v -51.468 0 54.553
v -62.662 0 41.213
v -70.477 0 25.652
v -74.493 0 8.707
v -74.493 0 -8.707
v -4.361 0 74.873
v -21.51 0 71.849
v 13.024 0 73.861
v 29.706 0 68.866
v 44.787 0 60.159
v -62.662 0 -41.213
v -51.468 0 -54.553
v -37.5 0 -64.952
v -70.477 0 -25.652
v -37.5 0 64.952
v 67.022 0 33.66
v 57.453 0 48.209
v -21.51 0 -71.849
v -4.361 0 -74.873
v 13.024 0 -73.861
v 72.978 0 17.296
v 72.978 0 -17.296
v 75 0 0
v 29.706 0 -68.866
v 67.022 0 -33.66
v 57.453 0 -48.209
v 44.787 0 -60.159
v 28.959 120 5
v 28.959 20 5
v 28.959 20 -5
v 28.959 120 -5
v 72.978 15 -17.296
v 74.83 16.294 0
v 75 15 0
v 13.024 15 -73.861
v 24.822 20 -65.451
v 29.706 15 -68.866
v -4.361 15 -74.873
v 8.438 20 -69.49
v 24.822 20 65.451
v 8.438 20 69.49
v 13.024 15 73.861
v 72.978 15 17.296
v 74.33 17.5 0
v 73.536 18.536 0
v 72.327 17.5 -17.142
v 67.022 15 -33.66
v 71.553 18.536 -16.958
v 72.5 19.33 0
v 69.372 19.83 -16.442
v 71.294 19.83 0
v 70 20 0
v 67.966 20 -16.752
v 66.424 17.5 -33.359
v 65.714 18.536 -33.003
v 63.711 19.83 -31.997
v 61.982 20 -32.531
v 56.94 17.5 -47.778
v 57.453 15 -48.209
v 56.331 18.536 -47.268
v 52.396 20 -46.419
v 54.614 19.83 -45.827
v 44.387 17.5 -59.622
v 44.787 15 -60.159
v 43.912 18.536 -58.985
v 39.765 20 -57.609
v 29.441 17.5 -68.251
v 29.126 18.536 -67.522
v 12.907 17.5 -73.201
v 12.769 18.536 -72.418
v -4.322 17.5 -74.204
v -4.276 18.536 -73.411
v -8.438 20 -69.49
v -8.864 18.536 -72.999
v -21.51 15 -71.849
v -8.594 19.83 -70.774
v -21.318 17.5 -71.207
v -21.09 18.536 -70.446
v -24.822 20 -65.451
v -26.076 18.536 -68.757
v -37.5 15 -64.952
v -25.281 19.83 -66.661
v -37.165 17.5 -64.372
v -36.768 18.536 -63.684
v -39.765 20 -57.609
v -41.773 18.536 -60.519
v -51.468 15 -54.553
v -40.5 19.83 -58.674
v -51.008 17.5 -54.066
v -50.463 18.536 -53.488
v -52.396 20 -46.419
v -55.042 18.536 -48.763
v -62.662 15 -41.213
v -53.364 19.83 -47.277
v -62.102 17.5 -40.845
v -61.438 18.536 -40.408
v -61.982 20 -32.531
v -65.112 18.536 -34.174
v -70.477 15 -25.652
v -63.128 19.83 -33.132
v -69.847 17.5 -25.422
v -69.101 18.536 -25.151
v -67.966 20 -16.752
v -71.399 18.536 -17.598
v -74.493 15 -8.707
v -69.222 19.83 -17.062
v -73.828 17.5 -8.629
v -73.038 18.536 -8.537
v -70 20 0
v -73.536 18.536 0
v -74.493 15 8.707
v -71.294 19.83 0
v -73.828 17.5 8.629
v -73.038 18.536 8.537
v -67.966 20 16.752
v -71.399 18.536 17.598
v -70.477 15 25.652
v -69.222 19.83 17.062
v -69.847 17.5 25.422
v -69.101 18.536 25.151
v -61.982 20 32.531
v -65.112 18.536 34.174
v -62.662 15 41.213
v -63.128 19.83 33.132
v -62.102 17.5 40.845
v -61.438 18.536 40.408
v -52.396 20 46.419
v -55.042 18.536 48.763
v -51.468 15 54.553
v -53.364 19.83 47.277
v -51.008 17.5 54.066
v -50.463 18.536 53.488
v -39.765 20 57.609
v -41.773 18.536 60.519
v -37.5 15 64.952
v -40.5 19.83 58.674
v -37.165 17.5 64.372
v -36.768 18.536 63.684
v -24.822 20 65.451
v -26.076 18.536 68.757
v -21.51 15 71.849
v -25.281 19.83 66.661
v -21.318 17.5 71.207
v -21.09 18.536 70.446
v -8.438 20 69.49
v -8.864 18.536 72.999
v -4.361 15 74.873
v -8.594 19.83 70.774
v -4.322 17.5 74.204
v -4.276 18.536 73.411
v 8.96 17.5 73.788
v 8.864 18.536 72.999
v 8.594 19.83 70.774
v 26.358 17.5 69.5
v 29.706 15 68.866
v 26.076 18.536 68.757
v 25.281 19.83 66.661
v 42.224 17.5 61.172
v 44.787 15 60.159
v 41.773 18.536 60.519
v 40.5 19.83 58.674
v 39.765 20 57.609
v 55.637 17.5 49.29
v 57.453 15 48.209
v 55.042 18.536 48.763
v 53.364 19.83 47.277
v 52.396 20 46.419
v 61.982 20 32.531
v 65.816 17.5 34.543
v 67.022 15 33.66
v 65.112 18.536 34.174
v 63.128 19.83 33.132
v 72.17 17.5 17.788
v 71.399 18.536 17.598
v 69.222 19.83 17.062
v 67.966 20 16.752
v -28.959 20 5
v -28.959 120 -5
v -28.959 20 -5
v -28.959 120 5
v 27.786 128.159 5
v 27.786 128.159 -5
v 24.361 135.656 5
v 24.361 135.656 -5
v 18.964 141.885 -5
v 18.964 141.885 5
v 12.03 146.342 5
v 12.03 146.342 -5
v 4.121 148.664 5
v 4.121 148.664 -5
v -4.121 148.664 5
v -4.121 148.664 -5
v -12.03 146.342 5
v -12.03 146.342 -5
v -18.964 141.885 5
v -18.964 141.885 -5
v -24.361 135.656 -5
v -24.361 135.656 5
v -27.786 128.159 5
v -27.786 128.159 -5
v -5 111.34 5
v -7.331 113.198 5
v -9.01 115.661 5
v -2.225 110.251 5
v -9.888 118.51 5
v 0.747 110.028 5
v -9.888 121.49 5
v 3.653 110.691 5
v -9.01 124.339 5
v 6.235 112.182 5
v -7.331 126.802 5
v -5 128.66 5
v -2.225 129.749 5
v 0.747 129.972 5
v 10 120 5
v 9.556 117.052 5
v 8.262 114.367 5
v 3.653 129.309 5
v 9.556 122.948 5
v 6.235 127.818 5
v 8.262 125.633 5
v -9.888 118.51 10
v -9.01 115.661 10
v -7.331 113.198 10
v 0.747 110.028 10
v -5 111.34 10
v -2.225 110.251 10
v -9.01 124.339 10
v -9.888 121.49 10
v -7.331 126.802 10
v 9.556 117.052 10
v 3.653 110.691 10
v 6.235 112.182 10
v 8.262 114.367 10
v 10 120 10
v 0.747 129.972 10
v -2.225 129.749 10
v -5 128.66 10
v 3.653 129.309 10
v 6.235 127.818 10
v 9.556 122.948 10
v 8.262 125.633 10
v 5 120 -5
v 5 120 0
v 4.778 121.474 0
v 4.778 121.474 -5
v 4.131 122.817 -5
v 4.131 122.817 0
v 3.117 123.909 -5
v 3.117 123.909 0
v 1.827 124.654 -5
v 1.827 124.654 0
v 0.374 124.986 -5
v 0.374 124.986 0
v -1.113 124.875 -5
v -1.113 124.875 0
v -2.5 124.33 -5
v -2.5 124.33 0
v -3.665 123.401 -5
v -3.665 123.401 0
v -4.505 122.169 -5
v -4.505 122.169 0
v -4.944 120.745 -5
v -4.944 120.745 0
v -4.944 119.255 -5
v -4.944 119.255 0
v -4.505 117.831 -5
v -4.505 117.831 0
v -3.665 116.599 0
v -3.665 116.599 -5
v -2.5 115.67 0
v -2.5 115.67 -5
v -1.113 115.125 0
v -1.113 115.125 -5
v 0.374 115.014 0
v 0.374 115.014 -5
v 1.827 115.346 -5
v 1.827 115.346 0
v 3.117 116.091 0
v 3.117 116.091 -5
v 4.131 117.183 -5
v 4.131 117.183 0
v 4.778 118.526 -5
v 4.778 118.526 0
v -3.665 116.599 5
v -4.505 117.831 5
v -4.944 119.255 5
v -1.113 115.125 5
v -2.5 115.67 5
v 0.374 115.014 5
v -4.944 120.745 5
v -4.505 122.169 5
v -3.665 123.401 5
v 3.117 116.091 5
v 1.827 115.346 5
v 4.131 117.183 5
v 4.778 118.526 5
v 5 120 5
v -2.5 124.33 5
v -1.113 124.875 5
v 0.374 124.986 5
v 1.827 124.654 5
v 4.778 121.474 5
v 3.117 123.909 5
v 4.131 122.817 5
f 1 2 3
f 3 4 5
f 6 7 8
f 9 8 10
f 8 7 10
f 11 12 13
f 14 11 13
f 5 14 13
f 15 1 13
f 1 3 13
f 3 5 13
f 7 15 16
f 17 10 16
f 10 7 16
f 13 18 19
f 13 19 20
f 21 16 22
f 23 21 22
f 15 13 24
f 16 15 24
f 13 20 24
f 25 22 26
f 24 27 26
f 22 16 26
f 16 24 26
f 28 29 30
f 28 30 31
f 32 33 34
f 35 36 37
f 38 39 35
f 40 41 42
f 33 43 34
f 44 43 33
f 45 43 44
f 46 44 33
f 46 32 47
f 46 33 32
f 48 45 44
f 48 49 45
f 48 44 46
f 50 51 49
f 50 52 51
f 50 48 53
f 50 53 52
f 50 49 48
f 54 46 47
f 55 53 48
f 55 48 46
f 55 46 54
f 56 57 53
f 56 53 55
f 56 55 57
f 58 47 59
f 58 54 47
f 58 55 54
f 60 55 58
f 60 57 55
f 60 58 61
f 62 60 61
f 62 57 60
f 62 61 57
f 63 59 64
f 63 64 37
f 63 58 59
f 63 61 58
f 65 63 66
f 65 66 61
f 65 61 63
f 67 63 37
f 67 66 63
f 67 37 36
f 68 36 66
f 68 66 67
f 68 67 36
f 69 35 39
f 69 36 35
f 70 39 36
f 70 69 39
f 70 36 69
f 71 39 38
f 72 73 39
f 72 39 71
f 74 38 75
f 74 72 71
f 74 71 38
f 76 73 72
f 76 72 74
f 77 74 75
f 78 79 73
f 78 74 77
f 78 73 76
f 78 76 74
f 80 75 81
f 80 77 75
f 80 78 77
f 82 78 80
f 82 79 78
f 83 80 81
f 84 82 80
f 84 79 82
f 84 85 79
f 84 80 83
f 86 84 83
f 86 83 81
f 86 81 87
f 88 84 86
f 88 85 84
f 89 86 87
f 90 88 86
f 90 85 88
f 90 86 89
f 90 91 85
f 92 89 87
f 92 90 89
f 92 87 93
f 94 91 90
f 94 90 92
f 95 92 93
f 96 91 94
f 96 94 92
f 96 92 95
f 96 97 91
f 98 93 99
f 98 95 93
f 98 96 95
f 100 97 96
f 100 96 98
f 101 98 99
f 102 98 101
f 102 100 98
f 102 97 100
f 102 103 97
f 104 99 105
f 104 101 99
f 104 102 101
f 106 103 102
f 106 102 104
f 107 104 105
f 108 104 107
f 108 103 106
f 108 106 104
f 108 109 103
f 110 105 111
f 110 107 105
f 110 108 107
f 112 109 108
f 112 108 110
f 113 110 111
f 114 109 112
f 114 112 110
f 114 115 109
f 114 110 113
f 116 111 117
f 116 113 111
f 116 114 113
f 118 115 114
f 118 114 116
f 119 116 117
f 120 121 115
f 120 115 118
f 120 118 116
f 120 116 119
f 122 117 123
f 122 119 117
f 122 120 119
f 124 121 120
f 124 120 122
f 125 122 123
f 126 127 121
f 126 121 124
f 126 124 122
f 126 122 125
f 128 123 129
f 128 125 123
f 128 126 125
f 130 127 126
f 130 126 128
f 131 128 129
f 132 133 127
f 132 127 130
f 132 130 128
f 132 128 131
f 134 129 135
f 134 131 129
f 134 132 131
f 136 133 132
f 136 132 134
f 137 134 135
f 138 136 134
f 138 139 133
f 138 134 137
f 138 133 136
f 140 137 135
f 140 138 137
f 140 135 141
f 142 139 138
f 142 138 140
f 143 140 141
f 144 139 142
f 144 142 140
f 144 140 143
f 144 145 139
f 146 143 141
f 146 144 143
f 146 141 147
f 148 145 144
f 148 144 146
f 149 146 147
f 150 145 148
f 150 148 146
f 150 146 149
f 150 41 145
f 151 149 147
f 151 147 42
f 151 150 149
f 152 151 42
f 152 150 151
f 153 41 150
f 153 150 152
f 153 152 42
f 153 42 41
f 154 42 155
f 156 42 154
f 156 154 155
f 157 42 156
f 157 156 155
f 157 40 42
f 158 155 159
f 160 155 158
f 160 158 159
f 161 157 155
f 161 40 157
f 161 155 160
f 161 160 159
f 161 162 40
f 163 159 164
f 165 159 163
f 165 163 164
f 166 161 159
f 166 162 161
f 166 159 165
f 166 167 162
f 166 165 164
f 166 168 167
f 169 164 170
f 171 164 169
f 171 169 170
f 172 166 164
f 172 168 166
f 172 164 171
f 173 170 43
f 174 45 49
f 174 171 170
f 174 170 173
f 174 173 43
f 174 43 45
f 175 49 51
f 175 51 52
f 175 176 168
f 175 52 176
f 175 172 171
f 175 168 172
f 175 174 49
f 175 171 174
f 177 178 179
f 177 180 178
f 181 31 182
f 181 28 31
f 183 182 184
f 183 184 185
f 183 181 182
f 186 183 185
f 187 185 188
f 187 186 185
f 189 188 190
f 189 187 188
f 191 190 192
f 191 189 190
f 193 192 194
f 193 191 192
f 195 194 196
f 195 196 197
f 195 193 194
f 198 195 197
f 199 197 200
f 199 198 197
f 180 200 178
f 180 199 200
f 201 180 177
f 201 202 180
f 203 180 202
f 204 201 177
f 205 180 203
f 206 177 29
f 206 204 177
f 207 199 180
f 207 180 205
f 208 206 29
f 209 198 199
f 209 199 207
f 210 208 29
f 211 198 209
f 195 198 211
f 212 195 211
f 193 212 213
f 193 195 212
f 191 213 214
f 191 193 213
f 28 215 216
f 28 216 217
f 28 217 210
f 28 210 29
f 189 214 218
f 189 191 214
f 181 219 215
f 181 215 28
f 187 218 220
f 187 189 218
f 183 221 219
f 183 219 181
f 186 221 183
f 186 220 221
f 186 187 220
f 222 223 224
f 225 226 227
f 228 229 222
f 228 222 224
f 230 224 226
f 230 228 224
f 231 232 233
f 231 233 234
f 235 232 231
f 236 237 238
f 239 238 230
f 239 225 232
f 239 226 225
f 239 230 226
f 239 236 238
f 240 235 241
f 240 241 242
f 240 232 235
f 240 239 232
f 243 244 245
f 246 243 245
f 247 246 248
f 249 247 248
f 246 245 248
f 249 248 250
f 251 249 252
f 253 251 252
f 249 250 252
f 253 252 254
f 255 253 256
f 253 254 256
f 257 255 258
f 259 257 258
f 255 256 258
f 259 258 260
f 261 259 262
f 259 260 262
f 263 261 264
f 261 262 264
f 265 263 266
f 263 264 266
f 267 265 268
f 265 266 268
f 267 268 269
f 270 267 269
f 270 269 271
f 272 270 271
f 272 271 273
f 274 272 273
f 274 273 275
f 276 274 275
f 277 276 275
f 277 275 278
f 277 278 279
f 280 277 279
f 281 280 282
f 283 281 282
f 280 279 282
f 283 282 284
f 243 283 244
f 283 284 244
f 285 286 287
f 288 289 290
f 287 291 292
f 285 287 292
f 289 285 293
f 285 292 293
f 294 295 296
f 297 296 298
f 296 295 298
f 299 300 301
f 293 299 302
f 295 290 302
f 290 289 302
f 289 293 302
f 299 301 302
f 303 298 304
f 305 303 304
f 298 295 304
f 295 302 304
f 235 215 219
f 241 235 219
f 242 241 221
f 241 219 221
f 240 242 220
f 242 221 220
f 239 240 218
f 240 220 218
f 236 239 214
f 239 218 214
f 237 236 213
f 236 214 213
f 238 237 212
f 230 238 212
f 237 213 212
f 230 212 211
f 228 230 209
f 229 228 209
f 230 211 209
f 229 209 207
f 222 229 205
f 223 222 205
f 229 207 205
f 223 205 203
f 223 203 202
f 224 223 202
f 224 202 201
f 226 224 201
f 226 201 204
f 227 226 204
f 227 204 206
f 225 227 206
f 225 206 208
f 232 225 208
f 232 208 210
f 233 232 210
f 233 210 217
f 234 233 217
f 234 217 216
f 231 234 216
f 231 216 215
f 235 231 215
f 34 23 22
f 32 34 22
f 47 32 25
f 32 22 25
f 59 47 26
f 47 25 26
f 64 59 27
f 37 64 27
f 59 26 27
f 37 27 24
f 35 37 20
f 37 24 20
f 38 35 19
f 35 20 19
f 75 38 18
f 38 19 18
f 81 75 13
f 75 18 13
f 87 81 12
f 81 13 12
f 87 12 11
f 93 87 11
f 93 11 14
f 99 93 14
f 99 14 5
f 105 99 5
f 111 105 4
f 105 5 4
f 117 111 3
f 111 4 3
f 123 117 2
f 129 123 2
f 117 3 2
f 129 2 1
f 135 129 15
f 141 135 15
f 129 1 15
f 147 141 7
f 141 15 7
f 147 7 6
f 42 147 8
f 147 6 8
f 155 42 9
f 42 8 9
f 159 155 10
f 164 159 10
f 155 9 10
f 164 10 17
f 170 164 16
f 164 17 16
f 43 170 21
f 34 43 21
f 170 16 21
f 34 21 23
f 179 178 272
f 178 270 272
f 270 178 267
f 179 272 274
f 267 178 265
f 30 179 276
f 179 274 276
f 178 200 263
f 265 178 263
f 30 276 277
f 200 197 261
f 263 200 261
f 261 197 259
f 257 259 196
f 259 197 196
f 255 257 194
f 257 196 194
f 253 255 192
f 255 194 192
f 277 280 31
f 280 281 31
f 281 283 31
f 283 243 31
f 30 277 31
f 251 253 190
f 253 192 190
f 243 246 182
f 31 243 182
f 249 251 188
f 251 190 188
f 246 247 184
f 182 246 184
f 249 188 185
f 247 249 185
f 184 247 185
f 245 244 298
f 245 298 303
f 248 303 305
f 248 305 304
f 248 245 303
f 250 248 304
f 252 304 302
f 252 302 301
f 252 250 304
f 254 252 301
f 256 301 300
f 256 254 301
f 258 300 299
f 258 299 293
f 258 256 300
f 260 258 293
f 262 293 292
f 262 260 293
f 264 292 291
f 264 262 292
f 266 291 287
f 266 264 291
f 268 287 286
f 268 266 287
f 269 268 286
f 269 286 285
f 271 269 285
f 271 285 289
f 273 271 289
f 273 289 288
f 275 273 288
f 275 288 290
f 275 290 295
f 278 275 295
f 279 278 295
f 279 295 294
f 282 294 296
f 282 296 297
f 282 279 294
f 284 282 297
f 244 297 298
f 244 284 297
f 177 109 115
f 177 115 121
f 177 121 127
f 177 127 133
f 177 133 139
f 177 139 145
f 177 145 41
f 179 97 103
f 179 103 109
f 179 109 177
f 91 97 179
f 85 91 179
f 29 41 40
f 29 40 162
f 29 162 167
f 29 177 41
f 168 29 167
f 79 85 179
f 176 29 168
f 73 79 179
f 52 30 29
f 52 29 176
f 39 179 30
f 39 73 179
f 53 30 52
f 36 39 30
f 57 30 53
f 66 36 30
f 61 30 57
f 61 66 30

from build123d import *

# Parameters (mm, degrees)
SKETCH1_R                = 75
BOSS_EXTRUDE1_DEPTH      = 20
FILLET1_R                = 5
BOSS_EXTRUDE2_DEPTH      = 5
BOSS_EXTRUDE2_DEPTH_BACK = 5
BOSS_EXTRUDE4_DEPTH      = 10
CUT_EXTRUDE2_DEPTH       = 5
CUT_EXTRUDE2_DEPTH_BACK  = 5
SKETCH4_R                = 5


with BuildPart() as part:
    # Sketch1 → Boss-Extrude1 (new body)
    with BuildSketch(Plane(origin=(0, 0, 0), x_dir=(1, 0, 0), z_dir=(0, 1, 0))):
        Circle(SKETCH1_R)
    extrude(amount=BOSS_EXTRUDE1_DEPTH)

    # Fillet1
    fillet1_edges = [part.edges().sort_by_distance(p)[0] for p in [
        (-75, 20, 0),
    ]]
    fillet(fillet1_edges, radius=FILLET1_R)

    # Sketch2 → Boss-Extrude2 (add, two sides: drawn at the far end of the back side and taken through both)
    with BuildSketch(Plane.XY.offset(-BOSS_EXTRUDE2_DEPTH_BACK)):
        with BuildLine():
            Line((-28.958565119, 120), (-28.958565119, 20))
            Line((-28.958565119, 20), (28.958565119, 20))
            Line((28.958565119, 20), (28.958565119, 120))
            ThreePointArc((28.958565119, 120), (0, 148.958565119), (-28.958565119, 120))
        make_face()
    extrude(amount=BOSS_EXTRUDE2_DEPTH + BOSS_EXTRUDE2_DEPTH_BACK)

    # Sketch3 → Boss-Extrude4 (add)
    with BuildSketch(Plane.XY):
        with BuildLine():
            ThreePointArc((0, 110), (7.071067812, 112.928932188), (10, 120))
            ThreePointArc((10, 120), (-7.071067812, 127.071067812), (0, 110))
        make_face()
    extrude(amount=BOSS_EXTRUDE4_DEPTH)

    # Sketch4 → Cut-Extrude2 (cut, two sides: drawn at the far end of the back side and taken through both)
    with BuildSketch(Plane.XY.offset(-CUT_EXTRUDE2_DEPTH_BACK)):
        with Locations((0, 120)):
            Circle(SKETCH4_R)
    extrude(amount=CUT_EXTRUDE2_DEPTH + CUT_EXTRUDE2_DEPTH_BACK, mode=Mode.SUBTRACT)


solid = part.part
